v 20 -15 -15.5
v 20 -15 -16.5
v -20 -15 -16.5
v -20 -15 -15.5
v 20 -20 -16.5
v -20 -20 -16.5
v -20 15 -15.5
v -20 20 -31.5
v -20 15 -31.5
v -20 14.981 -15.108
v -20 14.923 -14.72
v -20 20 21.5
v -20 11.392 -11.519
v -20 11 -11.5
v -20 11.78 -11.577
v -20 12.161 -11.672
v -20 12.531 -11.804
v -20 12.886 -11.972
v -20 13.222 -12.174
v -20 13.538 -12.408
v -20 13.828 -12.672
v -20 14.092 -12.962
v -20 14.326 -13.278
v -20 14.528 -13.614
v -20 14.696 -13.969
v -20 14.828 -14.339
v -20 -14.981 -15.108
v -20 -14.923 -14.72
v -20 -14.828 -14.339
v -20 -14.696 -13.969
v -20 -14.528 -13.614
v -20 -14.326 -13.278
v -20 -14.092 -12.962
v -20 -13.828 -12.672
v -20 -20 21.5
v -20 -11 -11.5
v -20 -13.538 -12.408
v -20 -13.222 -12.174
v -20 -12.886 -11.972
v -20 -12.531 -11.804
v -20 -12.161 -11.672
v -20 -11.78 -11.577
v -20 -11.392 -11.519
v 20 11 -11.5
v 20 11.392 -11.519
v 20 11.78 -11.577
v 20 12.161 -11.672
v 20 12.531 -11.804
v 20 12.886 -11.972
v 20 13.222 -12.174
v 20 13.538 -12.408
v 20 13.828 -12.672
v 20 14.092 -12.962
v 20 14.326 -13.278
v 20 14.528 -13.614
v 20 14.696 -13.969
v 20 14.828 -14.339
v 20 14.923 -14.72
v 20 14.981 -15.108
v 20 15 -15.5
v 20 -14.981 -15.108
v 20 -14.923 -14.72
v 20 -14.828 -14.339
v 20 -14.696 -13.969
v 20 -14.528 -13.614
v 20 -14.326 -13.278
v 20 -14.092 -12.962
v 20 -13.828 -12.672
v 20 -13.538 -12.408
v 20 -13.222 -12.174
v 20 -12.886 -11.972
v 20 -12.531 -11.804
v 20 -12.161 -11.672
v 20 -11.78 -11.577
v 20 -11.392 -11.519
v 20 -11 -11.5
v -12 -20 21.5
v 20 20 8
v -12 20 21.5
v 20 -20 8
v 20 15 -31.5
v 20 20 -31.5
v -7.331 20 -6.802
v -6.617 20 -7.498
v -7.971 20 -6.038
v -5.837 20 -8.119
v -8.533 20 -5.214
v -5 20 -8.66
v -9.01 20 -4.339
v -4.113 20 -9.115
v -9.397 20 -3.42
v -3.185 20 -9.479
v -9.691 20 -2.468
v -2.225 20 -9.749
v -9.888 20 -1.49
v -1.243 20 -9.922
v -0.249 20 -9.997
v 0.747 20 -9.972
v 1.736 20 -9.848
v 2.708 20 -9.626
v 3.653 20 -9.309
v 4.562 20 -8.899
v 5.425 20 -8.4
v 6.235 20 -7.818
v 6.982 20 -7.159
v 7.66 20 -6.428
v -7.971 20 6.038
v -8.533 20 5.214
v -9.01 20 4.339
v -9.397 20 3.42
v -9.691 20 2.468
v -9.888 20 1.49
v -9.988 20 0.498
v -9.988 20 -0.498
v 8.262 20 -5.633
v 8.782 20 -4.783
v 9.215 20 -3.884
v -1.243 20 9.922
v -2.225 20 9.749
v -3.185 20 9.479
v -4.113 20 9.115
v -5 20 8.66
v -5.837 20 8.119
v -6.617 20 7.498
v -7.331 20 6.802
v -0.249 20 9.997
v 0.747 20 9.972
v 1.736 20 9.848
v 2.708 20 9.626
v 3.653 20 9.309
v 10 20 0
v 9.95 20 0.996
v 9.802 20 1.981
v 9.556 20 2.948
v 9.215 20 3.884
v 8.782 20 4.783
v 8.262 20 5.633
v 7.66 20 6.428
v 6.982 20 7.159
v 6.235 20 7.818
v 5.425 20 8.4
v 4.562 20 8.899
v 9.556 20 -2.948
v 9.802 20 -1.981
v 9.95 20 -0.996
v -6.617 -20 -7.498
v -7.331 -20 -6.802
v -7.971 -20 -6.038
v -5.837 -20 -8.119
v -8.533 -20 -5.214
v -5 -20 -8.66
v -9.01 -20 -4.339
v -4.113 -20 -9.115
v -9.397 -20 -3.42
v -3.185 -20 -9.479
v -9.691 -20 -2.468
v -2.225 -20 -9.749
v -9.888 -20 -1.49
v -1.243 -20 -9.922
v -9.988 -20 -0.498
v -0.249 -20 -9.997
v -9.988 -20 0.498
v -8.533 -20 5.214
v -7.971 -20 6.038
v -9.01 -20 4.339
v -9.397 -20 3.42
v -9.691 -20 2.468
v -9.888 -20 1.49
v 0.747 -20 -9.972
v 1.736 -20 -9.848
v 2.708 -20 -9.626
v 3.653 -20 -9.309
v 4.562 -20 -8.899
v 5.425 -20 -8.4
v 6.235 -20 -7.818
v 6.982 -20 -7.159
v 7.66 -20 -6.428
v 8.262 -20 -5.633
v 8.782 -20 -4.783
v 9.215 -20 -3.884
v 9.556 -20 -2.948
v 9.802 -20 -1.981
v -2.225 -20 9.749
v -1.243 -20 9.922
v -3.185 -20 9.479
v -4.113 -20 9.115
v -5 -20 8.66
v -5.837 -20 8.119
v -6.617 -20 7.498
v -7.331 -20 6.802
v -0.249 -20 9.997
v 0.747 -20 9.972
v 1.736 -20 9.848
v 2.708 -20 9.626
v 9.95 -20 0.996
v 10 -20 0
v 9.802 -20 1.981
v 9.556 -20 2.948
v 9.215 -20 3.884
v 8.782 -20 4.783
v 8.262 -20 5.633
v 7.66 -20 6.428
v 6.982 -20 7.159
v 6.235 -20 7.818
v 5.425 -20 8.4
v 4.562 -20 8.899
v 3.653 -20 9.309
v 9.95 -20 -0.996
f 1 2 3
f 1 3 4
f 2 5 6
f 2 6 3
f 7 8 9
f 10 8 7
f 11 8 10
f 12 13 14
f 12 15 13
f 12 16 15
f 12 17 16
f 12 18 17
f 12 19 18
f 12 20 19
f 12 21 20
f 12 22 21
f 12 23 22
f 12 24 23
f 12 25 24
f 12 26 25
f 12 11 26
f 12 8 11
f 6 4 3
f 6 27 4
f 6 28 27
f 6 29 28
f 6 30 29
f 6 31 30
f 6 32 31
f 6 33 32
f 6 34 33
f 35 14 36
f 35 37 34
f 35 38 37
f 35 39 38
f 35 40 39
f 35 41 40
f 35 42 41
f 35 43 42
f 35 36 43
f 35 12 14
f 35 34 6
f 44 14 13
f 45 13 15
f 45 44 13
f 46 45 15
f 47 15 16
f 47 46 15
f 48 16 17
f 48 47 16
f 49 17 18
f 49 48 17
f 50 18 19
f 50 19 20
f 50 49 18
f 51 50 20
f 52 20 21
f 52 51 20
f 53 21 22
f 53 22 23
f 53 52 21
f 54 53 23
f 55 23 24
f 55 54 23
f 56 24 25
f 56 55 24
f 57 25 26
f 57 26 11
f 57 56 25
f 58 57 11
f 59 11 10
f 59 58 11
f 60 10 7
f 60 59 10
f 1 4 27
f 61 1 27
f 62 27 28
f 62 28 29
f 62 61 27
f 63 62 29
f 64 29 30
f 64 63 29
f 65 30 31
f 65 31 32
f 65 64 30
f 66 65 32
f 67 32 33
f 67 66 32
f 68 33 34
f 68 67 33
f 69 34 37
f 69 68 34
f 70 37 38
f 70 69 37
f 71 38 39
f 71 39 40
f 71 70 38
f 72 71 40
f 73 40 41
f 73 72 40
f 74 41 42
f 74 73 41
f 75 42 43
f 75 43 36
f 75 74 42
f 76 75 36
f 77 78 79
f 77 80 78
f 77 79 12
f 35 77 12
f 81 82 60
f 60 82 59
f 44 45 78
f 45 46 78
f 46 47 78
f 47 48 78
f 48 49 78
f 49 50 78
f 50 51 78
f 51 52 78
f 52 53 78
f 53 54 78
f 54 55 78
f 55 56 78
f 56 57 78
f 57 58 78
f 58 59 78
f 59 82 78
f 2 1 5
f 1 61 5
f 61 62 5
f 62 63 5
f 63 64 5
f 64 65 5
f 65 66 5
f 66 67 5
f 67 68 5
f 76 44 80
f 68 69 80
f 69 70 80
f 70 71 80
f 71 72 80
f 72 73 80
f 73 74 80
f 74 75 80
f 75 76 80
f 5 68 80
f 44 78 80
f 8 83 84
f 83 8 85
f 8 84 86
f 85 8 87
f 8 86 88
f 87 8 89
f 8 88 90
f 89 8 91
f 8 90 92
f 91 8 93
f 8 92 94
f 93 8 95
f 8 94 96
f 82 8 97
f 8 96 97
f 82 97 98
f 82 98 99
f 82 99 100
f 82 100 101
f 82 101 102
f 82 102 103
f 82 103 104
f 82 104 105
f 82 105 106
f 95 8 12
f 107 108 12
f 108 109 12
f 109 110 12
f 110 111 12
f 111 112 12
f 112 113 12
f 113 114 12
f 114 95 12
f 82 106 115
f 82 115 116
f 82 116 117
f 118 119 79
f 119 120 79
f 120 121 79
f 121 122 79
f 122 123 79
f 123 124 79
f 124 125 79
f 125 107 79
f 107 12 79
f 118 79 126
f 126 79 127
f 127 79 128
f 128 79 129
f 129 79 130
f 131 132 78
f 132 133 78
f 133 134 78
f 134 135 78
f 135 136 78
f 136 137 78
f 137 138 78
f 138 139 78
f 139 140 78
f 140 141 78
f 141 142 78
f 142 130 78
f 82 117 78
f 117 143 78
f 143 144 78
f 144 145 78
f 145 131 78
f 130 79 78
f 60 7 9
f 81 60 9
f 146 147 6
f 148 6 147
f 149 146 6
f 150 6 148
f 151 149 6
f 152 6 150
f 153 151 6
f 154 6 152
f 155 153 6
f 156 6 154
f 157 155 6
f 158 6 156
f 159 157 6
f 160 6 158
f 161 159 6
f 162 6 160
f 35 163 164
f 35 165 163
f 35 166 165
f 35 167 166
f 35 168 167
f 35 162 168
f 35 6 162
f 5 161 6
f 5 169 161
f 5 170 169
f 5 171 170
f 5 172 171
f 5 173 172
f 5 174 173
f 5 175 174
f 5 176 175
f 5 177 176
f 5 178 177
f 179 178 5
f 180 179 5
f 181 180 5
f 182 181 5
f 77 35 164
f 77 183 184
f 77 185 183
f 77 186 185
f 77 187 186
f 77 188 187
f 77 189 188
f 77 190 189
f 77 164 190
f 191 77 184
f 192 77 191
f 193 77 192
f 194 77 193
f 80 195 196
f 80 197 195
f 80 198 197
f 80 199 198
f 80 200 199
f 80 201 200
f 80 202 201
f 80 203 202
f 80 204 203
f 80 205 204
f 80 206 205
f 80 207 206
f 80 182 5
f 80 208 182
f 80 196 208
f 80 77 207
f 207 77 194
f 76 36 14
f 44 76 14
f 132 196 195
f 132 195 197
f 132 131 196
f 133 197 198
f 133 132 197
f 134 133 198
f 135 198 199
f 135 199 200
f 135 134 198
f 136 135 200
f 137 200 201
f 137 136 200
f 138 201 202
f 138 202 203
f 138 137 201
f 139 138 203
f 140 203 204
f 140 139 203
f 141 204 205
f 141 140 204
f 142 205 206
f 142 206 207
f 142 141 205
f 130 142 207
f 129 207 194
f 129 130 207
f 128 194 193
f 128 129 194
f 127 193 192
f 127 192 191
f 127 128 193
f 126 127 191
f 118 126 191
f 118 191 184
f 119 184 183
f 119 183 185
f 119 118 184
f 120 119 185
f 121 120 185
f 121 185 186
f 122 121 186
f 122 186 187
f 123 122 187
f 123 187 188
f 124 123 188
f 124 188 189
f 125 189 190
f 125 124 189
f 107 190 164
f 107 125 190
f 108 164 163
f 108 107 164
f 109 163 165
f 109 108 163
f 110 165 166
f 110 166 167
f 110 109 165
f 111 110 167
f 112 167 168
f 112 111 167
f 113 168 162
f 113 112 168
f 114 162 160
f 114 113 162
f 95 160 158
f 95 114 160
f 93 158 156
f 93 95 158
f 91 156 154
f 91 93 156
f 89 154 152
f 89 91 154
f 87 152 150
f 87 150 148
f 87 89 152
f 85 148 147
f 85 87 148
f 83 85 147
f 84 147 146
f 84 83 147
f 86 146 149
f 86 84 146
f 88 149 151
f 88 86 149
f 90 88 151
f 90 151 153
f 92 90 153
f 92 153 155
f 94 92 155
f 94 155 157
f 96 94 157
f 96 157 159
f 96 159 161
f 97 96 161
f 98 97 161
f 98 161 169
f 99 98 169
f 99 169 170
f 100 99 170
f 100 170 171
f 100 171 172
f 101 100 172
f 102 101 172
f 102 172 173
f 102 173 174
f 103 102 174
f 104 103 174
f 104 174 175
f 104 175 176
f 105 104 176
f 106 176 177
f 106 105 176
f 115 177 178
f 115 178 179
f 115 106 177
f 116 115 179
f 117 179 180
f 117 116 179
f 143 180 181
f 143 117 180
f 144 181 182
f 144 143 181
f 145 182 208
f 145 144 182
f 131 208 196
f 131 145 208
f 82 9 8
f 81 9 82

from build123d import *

# Parameters (mm, degrees)
F0_R      = 10
F1_DEPTH  = 20
F1_FACE_W = 40
F1_FACE_H = 40
F2_DEPTH  = 10
F4_DEPTH  = 40.001
F5_R      = 4


with BuildPart() as f1:
    # F0 (on Front) → F1 (new body, symmetric)
    with BuildSketch(Plane.XZ):
        Polygon((-12, 21.5), (-20, 21.5), (-20, -21.5), (20, -21.5), (20, 8), align=None)
        Circle(F0_R, mode=Mode.SUBTRACT)
    extrude(amount=F1_DEPTH, both=True)

    # F1_face (on face) → F2 (join)
    with BuildSketch(Plane(origin=(0, 0, -21.5), x_dir=(1, 0, 0), z_dir=(0, 0, -1))):
        Rectangle(F1_FACE_W, F1_FACE_H)
    extrude(amount=F2_DEPTH)

    # F3 (on face) → F4 (cut, through all)
    with BuildSketch(Plane(origin=(-20, 0, 0), x_dir=(0, -1, 0), z_dir=(-1, 0, 0))):
        Polygon((-15, -11.5), (-15, -31.5), (20, -31.5), (20, -16.5), (15, -16.5), (15, -11.5), align=None)
    extrude(amount=-F4_DEPTH, mode=Mode.SUBTRACT)

    # F5
    f5_edges = [f1.edges().sort_by_distance(p)[0] for p in [
        (0, 15, -11.5),
        (0, -15, -11.5),
    ]]
    fillet(f5_edges, radius=F5_R)


solid = f1.part
